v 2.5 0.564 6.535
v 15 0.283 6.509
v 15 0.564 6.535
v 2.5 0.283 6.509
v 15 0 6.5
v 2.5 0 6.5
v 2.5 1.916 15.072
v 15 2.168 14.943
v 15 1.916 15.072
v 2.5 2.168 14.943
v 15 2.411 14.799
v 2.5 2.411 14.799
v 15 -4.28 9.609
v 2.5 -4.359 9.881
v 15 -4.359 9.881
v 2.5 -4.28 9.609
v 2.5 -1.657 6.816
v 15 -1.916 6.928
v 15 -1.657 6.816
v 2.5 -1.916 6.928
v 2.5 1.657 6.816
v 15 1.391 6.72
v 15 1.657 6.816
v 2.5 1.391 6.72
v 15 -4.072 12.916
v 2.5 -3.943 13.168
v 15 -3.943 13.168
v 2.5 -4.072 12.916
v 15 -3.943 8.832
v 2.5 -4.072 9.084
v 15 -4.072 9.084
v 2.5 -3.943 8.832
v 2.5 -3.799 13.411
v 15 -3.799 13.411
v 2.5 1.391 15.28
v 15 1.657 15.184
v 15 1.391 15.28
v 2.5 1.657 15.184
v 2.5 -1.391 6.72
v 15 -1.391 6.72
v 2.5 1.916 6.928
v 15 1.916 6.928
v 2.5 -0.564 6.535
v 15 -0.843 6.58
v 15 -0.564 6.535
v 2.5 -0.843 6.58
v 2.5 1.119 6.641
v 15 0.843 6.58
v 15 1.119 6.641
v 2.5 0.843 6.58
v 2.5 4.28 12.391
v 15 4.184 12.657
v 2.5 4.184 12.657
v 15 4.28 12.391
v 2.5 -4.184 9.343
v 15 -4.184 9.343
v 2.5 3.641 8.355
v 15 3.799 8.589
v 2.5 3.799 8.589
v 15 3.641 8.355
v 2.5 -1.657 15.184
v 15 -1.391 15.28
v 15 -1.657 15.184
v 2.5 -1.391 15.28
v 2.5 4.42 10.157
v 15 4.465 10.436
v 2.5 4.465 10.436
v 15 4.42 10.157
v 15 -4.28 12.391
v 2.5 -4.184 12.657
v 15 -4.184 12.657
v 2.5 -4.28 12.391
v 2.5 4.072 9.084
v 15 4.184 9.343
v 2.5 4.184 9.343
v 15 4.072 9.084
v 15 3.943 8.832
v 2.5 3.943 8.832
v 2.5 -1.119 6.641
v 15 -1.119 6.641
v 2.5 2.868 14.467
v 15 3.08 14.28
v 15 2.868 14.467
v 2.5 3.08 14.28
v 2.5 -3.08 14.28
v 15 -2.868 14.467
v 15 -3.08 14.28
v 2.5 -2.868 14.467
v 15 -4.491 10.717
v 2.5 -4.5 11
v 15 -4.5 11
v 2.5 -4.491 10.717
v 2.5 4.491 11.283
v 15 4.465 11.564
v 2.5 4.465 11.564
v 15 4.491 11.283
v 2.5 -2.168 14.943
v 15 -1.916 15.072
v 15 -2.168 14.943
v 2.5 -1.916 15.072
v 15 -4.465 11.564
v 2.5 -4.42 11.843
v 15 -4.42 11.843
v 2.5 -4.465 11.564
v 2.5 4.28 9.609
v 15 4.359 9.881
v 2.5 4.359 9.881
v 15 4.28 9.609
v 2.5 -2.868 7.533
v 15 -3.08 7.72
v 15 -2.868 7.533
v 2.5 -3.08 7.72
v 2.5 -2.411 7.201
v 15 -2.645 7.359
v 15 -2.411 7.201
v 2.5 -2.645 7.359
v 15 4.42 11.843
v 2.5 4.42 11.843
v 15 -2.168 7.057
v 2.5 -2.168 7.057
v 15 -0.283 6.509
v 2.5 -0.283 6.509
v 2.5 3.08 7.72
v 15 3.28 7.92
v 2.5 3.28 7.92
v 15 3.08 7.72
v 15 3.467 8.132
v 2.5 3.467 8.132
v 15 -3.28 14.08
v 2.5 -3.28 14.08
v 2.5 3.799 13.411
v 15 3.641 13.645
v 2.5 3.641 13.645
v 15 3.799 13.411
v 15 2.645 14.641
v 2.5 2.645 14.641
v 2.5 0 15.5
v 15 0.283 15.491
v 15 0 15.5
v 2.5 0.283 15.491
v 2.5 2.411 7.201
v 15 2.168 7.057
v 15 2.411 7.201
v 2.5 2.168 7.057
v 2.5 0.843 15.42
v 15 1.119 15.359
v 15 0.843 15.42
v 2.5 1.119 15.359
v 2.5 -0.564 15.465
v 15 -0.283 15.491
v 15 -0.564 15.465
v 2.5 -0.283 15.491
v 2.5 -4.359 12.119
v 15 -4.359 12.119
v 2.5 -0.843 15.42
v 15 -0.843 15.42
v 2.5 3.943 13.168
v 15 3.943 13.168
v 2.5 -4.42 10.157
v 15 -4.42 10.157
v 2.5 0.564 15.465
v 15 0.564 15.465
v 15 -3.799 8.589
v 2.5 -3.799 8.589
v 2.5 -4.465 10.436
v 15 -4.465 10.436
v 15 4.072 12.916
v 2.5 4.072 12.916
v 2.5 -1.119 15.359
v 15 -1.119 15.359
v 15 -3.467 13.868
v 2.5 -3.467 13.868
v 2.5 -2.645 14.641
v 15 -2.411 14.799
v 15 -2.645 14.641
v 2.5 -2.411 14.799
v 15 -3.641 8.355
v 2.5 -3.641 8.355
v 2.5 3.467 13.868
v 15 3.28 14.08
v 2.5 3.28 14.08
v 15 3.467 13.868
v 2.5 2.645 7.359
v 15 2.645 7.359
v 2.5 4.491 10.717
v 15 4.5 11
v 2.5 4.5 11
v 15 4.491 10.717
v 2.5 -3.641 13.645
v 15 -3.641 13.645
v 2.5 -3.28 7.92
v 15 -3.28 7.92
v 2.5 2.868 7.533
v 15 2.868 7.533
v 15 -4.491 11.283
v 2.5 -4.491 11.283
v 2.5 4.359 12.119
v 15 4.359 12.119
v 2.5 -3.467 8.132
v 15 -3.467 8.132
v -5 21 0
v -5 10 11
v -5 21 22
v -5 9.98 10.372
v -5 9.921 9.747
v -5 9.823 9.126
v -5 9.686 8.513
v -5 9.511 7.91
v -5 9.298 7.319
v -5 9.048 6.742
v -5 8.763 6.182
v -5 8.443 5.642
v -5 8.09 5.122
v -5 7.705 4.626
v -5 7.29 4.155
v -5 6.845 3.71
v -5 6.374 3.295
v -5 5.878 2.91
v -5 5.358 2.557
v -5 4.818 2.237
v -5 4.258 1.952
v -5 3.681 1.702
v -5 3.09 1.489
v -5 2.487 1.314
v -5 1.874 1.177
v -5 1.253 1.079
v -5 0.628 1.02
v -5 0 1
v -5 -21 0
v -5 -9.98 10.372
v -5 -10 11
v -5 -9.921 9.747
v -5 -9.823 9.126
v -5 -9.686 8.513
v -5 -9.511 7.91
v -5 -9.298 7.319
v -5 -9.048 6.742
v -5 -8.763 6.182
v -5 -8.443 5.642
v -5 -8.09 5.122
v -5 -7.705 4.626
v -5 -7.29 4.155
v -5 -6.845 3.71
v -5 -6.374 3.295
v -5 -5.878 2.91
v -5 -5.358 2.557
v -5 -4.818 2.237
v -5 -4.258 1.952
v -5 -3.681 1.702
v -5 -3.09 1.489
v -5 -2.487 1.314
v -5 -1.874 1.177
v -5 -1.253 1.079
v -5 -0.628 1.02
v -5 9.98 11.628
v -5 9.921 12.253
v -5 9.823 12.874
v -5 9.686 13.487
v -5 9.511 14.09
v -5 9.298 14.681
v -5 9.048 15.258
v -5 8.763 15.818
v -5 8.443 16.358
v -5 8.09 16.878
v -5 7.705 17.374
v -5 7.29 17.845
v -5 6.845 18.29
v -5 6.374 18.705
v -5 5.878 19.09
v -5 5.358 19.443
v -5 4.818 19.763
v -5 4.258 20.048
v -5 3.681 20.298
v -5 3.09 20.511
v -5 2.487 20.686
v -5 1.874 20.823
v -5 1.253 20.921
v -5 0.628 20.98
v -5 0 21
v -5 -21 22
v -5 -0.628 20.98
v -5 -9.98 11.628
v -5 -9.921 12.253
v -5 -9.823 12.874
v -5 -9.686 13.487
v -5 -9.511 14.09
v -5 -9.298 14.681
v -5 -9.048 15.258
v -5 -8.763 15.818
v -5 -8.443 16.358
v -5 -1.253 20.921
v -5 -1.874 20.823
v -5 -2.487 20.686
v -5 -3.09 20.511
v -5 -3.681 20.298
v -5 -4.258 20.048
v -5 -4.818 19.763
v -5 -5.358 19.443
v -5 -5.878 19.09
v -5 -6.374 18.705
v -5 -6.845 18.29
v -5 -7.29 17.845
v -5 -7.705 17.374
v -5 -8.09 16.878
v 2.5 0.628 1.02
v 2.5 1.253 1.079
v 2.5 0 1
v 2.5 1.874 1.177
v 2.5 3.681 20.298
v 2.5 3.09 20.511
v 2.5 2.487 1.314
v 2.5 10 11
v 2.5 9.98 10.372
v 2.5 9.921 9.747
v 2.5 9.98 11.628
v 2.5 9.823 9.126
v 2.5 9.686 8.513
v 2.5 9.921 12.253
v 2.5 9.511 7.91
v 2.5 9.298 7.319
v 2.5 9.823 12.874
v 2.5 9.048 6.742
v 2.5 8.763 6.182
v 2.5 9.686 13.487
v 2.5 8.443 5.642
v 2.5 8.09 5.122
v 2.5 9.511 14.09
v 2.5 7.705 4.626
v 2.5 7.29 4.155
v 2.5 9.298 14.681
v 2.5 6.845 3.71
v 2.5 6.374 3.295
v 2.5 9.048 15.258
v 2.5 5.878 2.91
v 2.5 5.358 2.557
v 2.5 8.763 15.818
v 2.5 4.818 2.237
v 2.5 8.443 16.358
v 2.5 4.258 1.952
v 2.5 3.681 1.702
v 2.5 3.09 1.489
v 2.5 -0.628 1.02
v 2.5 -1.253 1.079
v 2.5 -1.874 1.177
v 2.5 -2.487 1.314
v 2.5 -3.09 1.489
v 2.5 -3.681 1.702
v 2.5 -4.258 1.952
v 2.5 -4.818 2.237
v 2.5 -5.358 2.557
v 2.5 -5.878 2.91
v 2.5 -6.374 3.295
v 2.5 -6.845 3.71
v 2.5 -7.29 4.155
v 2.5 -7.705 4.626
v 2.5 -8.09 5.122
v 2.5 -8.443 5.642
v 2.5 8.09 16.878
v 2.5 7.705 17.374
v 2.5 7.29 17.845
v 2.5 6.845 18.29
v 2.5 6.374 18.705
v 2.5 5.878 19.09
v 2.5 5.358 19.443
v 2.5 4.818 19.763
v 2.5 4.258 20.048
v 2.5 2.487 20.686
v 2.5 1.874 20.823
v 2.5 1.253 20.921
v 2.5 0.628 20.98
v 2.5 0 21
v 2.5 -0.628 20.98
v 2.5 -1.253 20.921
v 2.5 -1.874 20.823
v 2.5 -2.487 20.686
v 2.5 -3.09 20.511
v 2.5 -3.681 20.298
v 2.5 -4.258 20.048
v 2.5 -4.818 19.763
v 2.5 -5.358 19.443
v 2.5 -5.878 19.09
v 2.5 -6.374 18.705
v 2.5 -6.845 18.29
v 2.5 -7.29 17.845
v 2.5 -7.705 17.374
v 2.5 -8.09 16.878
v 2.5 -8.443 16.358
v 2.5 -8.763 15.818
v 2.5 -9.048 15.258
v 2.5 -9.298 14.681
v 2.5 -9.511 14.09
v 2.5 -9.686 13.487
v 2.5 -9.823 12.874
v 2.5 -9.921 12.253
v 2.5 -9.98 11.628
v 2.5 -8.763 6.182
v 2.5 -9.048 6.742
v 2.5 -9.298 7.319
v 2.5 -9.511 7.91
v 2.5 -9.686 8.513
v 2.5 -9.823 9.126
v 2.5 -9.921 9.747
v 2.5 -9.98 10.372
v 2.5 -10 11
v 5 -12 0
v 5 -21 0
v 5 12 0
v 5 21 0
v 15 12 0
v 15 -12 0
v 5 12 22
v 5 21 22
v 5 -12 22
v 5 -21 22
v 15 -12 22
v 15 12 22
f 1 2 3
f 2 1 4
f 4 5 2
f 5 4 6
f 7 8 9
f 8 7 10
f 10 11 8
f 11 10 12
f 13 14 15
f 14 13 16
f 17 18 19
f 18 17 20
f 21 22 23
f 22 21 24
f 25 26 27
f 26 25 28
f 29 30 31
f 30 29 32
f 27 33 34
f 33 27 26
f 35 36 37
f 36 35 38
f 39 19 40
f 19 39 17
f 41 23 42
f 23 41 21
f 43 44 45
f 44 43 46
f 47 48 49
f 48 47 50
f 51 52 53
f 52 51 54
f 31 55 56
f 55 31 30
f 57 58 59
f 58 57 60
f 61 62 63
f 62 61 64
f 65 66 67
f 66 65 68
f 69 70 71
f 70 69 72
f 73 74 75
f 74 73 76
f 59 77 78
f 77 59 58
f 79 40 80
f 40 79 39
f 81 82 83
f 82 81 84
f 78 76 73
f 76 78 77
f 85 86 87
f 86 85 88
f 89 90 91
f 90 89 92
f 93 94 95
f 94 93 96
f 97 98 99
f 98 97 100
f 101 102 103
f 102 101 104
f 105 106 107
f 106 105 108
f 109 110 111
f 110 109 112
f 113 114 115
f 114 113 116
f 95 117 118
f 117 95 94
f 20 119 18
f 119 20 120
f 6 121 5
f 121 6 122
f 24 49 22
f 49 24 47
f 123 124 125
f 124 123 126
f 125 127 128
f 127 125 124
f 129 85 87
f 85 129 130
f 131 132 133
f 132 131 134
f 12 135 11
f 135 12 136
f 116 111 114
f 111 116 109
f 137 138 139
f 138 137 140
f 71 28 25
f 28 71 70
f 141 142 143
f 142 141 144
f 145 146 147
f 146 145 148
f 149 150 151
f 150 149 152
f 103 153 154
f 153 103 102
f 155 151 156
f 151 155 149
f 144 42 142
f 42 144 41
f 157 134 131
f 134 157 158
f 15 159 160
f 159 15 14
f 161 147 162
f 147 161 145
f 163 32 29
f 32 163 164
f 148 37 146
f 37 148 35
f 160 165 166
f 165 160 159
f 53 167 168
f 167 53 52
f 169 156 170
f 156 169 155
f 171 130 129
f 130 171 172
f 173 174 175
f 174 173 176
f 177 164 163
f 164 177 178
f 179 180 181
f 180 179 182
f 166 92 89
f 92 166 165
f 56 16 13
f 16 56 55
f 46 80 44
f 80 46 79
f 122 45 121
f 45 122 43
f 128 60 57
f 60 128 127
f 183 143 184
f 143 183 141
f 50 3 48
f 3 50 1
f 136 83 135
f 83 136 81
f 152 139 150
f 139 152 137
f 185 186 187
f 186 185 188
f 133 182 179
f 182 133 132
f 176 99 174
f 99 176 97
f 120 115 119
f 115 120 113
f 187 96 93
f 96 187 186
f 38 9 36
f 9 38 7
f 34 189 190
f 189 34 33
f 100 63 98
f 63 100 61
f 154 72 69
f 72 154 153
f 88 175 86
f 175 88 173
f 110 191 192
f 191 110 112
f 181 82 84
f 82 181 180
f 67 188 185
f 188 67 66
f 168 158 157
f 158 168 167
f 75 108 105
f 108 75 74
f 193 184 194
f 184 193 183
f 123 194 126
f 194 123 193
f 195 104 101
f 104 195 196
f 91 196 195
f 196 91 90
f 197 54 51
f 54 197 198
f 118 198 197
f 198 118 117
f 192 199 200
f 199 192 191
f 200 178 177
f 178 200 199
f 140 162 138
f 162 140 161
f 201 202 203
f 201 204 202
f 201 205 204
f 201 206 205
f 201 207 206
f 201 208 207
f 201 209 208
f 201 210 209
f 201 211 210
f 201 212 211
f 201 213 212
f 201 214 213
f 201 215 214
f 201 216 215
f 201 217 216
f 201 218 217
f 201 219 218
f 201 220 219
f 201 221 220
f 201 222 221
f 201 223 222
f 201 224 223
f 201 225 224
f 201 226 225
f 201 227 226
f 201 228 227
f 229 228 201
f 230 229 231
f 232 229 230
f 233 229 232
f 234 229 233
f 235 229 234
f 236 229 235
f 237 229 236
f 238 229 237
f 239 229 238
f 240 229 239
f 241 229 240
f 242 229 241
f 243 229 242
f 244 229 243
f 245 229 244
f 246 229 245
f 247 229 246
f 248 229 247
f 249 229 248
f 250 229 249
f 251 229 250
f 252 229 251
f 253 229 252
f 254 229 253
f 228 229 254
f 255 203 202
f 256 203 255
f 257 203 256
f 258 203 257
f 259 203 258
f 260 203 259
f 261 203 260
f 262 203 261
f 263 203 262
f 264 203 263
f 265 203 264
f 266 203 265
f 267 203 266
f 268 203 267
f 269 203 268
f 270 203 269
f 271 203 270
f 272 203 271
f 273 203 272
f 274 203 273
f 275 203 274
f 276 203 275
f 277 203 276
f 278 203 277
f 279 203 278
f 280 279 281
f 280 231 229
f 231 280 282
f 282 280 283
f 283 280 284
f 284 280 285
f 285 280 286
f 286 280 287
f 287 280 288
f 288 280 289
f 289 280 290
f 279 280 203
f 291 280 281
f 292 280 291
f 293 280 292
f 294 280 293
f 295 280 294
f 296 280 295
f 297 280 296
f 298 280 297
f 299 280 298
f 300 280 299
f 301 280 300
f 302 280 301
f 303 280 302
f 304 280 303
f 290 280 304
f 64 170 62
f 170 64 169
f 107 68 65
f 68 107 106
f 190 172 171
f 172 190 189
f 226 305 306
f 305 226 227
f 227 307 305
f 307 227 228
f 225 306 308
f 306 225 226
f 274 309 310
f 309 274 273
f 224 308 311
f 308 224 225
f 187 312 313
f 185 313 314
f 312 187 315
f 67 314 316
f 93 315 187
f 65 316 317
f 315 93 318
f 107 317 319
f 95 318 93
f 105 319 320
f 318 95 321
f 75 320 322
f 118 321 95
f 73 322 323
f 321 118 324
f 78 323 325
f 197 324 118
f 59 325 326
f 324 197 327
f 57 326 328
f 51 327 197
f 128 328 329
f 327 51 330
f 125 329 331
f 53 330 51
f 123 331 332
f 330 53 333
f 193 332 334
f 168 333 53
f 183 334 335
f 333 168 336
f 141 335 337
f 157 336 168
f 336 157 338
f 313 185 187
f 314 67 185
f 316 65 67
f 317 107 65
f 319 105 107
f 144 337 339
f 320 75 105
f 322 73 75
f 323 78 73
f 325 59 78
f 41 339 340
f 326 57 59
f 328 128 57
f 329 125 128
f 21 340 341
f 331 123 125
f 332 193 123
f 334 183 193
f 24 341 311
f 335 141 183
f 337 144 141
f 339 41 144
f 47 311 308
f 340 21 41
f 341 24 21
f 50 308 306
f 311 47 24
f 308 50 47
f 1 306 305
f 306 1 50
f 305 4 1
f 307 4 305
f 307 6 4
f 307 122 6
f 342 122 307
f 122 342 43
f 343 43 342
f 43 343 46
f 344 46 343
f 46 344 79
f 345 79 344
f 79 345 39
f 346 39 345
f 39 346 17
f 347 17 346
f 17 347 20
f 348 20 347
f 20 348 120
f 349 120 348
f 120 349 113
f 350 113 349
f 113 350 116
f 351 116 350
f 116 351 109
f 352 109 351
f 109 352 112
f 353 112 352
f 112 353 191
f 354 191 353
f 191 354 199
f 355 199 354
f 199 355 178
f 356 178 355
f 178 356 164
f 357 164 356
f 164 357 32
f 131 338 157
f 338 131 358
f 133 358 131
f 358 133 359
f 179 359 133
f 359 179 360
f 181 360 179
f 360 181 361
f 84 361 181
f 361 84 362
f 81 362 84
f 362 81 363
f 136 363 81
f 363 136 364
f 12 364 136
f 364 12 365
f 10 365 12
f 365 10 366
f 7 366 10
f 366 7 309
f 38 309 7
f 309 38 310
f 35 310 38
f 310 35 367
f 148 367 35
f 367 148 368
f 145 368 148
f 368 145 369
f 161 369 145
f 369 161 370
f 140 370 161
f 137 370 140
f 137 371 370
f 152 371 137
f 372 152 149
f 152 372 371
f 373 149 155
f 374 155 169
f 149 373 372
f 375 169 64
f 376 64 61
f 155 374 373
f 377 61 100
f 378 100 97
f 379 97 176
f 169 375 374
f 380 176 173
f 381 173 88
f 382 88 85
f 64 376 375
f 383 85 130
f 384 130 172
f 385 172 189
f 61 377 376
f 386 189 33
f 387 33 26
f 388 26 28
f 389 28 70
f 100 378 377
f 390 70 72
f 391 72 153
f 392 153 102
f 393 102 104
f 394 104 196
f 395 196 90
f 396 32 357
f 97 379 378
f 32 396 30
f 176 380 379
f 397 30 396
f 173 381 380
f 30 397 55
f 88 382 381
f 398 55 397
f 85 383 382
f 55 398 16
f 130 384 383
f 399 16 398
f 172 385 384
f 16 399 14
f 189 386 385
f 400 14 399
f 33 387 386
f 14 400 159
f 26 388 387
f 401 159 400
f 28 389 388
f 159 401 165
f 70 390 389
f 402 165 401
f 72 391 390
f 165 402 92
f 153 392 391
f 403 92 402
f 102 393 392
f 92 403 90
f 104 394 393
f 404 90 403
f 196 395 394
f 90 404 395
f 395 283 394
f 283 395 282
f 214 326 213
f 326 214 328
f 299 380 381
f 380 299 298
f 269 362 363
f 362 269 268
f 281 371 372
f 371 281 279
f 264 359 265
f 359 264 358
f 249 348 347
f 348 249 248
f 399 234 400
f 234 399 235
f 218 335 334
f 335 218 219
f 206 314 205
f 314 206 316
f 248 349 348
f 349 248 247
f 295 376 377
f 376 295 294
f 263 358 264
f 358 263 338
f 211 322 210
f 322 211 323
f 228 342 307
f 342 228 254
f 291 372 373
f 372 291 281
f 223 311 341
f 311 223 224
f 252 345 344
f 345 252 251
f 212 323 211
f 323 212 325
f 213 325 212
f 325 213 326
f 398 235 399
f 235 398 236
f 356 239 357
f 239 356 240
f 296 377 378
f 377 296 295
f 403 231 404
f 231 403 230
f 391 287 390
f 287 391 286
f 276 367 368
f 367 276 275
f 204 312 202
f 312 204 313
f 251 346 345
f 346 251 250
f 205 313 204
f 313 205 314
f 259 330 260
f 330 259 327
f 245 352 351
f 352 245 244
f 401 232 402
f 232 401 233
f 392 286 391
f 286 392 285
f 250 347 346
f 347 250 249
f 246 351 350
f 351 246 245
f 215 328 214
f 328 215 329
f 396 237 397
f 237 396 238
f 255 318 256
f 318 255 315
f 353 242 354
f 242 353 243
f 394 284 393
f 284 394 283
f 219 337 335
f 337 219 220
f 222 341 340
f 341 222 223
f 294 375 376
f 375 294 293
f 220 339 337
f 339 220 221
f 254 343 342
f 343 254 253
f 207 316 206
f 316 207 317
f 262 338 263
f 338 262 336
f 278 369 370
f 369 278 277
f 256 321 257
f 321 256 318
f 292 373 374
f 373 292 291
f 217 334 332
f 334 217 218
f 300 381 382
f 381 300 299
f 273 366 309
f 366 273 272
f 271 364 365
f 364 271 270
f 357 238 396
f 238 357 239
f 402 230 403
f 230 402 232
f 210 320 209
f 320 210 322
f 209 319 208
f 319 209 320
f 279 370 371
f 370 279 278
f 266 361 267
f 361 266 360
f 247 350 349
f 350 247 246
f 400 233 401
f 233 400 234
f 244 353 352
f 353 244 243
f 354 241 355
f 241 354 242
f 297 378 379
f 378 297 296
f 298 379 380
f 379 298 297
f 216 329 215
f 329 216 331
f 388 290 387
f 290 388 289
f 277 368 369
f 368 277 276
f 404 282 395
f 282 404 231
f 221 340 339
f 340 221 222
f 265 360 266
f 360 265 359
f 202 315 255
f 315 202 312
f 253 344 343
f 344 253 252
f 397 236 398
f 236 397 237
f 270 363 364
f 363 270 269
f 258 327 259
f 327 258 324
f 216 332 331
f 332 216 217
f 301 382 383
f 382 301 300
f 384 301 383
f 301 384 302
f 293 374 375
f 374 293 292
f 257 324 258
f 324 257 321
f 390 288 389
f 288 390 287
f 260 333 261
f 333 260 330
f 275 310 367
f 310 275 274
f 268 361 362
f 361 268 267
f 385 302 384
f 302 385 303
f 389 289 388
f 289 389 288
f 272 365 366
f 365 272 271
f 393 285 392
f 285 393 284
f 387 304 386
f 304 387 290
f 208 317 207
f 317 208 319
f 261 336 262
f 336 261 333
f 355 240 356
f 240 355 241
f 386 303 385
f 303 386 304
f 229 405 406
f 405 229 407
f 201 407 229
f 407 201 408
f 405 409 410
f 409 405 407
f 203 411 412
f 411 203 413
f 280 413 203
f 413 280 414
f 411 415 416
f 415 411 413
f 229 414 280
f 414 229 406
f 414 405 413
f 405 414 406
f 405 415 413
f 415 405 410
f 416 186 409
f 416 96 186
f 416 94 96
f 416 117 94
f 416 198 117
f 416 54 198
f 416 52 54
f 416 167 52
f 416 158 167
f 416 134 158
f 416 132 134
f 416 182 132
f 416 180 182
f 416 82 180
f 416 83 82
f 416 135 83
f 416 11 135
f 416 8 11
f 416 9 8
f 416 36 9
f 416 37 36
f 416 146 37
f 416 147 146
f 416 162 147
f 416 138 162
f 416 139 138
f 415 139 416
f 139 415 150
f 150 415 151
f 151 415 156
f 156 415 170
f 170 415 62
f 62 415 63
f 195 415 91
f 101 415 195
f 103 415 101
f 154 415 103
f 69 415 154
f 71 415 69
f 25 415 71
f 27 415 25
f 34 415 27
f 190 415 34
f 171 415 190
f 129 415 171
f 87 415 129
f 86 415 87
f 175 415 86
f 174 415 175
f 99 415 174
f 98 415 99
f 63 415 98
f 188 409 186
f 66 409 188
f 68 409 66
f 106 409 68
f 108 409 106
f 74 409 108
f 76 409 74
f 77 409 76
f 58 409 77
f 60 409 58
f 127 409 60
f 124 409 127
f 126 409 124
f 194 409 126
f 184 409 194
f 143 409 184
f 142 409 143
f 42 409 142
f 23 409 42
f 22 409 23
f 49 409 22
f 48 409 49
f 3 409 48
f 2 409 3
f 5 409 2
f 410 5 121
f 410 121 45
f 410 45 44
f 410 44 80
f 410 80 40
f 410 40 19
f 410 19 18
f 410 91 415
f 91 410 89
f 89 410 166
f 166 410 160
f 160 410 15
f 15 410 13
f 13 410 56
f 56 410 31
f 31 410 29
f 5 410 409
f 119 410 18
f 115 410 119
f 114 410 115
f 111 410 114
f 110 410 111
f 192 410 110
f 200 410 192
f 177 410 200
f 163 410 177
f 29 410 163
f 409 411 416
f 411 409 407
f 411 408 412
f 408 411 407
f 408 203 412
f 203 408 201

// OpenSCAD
$fn=100;

height = 10;
webbing_thickness = 7.2;
hole_edge = 24;

washer_id = 9;
washer_od = 20;

clip_width = washer_od;
clip_len = 4*webbing_thickness+hole_edge;

retainer_edge = 42;

difference () {
linear_extrude(1.1*washer_od) {
    union() {
        square([height, retainer_edge],center=true);
        translate([height, 0, 0]) {
            square([height, hole_edge],center=true);
        }
    }
}
color("red") {
        translate([-height/2, 0, 1.1*washer_od/2]) {
            rotate([0, 90, 0]) {
                union()
                {
                    cylinder(d=washer_id, h=2*height+0.2, center=false);
                    cylinder(d=washer_od, h=3*height/4, center=false);
                }
            }
        }
    }
}
